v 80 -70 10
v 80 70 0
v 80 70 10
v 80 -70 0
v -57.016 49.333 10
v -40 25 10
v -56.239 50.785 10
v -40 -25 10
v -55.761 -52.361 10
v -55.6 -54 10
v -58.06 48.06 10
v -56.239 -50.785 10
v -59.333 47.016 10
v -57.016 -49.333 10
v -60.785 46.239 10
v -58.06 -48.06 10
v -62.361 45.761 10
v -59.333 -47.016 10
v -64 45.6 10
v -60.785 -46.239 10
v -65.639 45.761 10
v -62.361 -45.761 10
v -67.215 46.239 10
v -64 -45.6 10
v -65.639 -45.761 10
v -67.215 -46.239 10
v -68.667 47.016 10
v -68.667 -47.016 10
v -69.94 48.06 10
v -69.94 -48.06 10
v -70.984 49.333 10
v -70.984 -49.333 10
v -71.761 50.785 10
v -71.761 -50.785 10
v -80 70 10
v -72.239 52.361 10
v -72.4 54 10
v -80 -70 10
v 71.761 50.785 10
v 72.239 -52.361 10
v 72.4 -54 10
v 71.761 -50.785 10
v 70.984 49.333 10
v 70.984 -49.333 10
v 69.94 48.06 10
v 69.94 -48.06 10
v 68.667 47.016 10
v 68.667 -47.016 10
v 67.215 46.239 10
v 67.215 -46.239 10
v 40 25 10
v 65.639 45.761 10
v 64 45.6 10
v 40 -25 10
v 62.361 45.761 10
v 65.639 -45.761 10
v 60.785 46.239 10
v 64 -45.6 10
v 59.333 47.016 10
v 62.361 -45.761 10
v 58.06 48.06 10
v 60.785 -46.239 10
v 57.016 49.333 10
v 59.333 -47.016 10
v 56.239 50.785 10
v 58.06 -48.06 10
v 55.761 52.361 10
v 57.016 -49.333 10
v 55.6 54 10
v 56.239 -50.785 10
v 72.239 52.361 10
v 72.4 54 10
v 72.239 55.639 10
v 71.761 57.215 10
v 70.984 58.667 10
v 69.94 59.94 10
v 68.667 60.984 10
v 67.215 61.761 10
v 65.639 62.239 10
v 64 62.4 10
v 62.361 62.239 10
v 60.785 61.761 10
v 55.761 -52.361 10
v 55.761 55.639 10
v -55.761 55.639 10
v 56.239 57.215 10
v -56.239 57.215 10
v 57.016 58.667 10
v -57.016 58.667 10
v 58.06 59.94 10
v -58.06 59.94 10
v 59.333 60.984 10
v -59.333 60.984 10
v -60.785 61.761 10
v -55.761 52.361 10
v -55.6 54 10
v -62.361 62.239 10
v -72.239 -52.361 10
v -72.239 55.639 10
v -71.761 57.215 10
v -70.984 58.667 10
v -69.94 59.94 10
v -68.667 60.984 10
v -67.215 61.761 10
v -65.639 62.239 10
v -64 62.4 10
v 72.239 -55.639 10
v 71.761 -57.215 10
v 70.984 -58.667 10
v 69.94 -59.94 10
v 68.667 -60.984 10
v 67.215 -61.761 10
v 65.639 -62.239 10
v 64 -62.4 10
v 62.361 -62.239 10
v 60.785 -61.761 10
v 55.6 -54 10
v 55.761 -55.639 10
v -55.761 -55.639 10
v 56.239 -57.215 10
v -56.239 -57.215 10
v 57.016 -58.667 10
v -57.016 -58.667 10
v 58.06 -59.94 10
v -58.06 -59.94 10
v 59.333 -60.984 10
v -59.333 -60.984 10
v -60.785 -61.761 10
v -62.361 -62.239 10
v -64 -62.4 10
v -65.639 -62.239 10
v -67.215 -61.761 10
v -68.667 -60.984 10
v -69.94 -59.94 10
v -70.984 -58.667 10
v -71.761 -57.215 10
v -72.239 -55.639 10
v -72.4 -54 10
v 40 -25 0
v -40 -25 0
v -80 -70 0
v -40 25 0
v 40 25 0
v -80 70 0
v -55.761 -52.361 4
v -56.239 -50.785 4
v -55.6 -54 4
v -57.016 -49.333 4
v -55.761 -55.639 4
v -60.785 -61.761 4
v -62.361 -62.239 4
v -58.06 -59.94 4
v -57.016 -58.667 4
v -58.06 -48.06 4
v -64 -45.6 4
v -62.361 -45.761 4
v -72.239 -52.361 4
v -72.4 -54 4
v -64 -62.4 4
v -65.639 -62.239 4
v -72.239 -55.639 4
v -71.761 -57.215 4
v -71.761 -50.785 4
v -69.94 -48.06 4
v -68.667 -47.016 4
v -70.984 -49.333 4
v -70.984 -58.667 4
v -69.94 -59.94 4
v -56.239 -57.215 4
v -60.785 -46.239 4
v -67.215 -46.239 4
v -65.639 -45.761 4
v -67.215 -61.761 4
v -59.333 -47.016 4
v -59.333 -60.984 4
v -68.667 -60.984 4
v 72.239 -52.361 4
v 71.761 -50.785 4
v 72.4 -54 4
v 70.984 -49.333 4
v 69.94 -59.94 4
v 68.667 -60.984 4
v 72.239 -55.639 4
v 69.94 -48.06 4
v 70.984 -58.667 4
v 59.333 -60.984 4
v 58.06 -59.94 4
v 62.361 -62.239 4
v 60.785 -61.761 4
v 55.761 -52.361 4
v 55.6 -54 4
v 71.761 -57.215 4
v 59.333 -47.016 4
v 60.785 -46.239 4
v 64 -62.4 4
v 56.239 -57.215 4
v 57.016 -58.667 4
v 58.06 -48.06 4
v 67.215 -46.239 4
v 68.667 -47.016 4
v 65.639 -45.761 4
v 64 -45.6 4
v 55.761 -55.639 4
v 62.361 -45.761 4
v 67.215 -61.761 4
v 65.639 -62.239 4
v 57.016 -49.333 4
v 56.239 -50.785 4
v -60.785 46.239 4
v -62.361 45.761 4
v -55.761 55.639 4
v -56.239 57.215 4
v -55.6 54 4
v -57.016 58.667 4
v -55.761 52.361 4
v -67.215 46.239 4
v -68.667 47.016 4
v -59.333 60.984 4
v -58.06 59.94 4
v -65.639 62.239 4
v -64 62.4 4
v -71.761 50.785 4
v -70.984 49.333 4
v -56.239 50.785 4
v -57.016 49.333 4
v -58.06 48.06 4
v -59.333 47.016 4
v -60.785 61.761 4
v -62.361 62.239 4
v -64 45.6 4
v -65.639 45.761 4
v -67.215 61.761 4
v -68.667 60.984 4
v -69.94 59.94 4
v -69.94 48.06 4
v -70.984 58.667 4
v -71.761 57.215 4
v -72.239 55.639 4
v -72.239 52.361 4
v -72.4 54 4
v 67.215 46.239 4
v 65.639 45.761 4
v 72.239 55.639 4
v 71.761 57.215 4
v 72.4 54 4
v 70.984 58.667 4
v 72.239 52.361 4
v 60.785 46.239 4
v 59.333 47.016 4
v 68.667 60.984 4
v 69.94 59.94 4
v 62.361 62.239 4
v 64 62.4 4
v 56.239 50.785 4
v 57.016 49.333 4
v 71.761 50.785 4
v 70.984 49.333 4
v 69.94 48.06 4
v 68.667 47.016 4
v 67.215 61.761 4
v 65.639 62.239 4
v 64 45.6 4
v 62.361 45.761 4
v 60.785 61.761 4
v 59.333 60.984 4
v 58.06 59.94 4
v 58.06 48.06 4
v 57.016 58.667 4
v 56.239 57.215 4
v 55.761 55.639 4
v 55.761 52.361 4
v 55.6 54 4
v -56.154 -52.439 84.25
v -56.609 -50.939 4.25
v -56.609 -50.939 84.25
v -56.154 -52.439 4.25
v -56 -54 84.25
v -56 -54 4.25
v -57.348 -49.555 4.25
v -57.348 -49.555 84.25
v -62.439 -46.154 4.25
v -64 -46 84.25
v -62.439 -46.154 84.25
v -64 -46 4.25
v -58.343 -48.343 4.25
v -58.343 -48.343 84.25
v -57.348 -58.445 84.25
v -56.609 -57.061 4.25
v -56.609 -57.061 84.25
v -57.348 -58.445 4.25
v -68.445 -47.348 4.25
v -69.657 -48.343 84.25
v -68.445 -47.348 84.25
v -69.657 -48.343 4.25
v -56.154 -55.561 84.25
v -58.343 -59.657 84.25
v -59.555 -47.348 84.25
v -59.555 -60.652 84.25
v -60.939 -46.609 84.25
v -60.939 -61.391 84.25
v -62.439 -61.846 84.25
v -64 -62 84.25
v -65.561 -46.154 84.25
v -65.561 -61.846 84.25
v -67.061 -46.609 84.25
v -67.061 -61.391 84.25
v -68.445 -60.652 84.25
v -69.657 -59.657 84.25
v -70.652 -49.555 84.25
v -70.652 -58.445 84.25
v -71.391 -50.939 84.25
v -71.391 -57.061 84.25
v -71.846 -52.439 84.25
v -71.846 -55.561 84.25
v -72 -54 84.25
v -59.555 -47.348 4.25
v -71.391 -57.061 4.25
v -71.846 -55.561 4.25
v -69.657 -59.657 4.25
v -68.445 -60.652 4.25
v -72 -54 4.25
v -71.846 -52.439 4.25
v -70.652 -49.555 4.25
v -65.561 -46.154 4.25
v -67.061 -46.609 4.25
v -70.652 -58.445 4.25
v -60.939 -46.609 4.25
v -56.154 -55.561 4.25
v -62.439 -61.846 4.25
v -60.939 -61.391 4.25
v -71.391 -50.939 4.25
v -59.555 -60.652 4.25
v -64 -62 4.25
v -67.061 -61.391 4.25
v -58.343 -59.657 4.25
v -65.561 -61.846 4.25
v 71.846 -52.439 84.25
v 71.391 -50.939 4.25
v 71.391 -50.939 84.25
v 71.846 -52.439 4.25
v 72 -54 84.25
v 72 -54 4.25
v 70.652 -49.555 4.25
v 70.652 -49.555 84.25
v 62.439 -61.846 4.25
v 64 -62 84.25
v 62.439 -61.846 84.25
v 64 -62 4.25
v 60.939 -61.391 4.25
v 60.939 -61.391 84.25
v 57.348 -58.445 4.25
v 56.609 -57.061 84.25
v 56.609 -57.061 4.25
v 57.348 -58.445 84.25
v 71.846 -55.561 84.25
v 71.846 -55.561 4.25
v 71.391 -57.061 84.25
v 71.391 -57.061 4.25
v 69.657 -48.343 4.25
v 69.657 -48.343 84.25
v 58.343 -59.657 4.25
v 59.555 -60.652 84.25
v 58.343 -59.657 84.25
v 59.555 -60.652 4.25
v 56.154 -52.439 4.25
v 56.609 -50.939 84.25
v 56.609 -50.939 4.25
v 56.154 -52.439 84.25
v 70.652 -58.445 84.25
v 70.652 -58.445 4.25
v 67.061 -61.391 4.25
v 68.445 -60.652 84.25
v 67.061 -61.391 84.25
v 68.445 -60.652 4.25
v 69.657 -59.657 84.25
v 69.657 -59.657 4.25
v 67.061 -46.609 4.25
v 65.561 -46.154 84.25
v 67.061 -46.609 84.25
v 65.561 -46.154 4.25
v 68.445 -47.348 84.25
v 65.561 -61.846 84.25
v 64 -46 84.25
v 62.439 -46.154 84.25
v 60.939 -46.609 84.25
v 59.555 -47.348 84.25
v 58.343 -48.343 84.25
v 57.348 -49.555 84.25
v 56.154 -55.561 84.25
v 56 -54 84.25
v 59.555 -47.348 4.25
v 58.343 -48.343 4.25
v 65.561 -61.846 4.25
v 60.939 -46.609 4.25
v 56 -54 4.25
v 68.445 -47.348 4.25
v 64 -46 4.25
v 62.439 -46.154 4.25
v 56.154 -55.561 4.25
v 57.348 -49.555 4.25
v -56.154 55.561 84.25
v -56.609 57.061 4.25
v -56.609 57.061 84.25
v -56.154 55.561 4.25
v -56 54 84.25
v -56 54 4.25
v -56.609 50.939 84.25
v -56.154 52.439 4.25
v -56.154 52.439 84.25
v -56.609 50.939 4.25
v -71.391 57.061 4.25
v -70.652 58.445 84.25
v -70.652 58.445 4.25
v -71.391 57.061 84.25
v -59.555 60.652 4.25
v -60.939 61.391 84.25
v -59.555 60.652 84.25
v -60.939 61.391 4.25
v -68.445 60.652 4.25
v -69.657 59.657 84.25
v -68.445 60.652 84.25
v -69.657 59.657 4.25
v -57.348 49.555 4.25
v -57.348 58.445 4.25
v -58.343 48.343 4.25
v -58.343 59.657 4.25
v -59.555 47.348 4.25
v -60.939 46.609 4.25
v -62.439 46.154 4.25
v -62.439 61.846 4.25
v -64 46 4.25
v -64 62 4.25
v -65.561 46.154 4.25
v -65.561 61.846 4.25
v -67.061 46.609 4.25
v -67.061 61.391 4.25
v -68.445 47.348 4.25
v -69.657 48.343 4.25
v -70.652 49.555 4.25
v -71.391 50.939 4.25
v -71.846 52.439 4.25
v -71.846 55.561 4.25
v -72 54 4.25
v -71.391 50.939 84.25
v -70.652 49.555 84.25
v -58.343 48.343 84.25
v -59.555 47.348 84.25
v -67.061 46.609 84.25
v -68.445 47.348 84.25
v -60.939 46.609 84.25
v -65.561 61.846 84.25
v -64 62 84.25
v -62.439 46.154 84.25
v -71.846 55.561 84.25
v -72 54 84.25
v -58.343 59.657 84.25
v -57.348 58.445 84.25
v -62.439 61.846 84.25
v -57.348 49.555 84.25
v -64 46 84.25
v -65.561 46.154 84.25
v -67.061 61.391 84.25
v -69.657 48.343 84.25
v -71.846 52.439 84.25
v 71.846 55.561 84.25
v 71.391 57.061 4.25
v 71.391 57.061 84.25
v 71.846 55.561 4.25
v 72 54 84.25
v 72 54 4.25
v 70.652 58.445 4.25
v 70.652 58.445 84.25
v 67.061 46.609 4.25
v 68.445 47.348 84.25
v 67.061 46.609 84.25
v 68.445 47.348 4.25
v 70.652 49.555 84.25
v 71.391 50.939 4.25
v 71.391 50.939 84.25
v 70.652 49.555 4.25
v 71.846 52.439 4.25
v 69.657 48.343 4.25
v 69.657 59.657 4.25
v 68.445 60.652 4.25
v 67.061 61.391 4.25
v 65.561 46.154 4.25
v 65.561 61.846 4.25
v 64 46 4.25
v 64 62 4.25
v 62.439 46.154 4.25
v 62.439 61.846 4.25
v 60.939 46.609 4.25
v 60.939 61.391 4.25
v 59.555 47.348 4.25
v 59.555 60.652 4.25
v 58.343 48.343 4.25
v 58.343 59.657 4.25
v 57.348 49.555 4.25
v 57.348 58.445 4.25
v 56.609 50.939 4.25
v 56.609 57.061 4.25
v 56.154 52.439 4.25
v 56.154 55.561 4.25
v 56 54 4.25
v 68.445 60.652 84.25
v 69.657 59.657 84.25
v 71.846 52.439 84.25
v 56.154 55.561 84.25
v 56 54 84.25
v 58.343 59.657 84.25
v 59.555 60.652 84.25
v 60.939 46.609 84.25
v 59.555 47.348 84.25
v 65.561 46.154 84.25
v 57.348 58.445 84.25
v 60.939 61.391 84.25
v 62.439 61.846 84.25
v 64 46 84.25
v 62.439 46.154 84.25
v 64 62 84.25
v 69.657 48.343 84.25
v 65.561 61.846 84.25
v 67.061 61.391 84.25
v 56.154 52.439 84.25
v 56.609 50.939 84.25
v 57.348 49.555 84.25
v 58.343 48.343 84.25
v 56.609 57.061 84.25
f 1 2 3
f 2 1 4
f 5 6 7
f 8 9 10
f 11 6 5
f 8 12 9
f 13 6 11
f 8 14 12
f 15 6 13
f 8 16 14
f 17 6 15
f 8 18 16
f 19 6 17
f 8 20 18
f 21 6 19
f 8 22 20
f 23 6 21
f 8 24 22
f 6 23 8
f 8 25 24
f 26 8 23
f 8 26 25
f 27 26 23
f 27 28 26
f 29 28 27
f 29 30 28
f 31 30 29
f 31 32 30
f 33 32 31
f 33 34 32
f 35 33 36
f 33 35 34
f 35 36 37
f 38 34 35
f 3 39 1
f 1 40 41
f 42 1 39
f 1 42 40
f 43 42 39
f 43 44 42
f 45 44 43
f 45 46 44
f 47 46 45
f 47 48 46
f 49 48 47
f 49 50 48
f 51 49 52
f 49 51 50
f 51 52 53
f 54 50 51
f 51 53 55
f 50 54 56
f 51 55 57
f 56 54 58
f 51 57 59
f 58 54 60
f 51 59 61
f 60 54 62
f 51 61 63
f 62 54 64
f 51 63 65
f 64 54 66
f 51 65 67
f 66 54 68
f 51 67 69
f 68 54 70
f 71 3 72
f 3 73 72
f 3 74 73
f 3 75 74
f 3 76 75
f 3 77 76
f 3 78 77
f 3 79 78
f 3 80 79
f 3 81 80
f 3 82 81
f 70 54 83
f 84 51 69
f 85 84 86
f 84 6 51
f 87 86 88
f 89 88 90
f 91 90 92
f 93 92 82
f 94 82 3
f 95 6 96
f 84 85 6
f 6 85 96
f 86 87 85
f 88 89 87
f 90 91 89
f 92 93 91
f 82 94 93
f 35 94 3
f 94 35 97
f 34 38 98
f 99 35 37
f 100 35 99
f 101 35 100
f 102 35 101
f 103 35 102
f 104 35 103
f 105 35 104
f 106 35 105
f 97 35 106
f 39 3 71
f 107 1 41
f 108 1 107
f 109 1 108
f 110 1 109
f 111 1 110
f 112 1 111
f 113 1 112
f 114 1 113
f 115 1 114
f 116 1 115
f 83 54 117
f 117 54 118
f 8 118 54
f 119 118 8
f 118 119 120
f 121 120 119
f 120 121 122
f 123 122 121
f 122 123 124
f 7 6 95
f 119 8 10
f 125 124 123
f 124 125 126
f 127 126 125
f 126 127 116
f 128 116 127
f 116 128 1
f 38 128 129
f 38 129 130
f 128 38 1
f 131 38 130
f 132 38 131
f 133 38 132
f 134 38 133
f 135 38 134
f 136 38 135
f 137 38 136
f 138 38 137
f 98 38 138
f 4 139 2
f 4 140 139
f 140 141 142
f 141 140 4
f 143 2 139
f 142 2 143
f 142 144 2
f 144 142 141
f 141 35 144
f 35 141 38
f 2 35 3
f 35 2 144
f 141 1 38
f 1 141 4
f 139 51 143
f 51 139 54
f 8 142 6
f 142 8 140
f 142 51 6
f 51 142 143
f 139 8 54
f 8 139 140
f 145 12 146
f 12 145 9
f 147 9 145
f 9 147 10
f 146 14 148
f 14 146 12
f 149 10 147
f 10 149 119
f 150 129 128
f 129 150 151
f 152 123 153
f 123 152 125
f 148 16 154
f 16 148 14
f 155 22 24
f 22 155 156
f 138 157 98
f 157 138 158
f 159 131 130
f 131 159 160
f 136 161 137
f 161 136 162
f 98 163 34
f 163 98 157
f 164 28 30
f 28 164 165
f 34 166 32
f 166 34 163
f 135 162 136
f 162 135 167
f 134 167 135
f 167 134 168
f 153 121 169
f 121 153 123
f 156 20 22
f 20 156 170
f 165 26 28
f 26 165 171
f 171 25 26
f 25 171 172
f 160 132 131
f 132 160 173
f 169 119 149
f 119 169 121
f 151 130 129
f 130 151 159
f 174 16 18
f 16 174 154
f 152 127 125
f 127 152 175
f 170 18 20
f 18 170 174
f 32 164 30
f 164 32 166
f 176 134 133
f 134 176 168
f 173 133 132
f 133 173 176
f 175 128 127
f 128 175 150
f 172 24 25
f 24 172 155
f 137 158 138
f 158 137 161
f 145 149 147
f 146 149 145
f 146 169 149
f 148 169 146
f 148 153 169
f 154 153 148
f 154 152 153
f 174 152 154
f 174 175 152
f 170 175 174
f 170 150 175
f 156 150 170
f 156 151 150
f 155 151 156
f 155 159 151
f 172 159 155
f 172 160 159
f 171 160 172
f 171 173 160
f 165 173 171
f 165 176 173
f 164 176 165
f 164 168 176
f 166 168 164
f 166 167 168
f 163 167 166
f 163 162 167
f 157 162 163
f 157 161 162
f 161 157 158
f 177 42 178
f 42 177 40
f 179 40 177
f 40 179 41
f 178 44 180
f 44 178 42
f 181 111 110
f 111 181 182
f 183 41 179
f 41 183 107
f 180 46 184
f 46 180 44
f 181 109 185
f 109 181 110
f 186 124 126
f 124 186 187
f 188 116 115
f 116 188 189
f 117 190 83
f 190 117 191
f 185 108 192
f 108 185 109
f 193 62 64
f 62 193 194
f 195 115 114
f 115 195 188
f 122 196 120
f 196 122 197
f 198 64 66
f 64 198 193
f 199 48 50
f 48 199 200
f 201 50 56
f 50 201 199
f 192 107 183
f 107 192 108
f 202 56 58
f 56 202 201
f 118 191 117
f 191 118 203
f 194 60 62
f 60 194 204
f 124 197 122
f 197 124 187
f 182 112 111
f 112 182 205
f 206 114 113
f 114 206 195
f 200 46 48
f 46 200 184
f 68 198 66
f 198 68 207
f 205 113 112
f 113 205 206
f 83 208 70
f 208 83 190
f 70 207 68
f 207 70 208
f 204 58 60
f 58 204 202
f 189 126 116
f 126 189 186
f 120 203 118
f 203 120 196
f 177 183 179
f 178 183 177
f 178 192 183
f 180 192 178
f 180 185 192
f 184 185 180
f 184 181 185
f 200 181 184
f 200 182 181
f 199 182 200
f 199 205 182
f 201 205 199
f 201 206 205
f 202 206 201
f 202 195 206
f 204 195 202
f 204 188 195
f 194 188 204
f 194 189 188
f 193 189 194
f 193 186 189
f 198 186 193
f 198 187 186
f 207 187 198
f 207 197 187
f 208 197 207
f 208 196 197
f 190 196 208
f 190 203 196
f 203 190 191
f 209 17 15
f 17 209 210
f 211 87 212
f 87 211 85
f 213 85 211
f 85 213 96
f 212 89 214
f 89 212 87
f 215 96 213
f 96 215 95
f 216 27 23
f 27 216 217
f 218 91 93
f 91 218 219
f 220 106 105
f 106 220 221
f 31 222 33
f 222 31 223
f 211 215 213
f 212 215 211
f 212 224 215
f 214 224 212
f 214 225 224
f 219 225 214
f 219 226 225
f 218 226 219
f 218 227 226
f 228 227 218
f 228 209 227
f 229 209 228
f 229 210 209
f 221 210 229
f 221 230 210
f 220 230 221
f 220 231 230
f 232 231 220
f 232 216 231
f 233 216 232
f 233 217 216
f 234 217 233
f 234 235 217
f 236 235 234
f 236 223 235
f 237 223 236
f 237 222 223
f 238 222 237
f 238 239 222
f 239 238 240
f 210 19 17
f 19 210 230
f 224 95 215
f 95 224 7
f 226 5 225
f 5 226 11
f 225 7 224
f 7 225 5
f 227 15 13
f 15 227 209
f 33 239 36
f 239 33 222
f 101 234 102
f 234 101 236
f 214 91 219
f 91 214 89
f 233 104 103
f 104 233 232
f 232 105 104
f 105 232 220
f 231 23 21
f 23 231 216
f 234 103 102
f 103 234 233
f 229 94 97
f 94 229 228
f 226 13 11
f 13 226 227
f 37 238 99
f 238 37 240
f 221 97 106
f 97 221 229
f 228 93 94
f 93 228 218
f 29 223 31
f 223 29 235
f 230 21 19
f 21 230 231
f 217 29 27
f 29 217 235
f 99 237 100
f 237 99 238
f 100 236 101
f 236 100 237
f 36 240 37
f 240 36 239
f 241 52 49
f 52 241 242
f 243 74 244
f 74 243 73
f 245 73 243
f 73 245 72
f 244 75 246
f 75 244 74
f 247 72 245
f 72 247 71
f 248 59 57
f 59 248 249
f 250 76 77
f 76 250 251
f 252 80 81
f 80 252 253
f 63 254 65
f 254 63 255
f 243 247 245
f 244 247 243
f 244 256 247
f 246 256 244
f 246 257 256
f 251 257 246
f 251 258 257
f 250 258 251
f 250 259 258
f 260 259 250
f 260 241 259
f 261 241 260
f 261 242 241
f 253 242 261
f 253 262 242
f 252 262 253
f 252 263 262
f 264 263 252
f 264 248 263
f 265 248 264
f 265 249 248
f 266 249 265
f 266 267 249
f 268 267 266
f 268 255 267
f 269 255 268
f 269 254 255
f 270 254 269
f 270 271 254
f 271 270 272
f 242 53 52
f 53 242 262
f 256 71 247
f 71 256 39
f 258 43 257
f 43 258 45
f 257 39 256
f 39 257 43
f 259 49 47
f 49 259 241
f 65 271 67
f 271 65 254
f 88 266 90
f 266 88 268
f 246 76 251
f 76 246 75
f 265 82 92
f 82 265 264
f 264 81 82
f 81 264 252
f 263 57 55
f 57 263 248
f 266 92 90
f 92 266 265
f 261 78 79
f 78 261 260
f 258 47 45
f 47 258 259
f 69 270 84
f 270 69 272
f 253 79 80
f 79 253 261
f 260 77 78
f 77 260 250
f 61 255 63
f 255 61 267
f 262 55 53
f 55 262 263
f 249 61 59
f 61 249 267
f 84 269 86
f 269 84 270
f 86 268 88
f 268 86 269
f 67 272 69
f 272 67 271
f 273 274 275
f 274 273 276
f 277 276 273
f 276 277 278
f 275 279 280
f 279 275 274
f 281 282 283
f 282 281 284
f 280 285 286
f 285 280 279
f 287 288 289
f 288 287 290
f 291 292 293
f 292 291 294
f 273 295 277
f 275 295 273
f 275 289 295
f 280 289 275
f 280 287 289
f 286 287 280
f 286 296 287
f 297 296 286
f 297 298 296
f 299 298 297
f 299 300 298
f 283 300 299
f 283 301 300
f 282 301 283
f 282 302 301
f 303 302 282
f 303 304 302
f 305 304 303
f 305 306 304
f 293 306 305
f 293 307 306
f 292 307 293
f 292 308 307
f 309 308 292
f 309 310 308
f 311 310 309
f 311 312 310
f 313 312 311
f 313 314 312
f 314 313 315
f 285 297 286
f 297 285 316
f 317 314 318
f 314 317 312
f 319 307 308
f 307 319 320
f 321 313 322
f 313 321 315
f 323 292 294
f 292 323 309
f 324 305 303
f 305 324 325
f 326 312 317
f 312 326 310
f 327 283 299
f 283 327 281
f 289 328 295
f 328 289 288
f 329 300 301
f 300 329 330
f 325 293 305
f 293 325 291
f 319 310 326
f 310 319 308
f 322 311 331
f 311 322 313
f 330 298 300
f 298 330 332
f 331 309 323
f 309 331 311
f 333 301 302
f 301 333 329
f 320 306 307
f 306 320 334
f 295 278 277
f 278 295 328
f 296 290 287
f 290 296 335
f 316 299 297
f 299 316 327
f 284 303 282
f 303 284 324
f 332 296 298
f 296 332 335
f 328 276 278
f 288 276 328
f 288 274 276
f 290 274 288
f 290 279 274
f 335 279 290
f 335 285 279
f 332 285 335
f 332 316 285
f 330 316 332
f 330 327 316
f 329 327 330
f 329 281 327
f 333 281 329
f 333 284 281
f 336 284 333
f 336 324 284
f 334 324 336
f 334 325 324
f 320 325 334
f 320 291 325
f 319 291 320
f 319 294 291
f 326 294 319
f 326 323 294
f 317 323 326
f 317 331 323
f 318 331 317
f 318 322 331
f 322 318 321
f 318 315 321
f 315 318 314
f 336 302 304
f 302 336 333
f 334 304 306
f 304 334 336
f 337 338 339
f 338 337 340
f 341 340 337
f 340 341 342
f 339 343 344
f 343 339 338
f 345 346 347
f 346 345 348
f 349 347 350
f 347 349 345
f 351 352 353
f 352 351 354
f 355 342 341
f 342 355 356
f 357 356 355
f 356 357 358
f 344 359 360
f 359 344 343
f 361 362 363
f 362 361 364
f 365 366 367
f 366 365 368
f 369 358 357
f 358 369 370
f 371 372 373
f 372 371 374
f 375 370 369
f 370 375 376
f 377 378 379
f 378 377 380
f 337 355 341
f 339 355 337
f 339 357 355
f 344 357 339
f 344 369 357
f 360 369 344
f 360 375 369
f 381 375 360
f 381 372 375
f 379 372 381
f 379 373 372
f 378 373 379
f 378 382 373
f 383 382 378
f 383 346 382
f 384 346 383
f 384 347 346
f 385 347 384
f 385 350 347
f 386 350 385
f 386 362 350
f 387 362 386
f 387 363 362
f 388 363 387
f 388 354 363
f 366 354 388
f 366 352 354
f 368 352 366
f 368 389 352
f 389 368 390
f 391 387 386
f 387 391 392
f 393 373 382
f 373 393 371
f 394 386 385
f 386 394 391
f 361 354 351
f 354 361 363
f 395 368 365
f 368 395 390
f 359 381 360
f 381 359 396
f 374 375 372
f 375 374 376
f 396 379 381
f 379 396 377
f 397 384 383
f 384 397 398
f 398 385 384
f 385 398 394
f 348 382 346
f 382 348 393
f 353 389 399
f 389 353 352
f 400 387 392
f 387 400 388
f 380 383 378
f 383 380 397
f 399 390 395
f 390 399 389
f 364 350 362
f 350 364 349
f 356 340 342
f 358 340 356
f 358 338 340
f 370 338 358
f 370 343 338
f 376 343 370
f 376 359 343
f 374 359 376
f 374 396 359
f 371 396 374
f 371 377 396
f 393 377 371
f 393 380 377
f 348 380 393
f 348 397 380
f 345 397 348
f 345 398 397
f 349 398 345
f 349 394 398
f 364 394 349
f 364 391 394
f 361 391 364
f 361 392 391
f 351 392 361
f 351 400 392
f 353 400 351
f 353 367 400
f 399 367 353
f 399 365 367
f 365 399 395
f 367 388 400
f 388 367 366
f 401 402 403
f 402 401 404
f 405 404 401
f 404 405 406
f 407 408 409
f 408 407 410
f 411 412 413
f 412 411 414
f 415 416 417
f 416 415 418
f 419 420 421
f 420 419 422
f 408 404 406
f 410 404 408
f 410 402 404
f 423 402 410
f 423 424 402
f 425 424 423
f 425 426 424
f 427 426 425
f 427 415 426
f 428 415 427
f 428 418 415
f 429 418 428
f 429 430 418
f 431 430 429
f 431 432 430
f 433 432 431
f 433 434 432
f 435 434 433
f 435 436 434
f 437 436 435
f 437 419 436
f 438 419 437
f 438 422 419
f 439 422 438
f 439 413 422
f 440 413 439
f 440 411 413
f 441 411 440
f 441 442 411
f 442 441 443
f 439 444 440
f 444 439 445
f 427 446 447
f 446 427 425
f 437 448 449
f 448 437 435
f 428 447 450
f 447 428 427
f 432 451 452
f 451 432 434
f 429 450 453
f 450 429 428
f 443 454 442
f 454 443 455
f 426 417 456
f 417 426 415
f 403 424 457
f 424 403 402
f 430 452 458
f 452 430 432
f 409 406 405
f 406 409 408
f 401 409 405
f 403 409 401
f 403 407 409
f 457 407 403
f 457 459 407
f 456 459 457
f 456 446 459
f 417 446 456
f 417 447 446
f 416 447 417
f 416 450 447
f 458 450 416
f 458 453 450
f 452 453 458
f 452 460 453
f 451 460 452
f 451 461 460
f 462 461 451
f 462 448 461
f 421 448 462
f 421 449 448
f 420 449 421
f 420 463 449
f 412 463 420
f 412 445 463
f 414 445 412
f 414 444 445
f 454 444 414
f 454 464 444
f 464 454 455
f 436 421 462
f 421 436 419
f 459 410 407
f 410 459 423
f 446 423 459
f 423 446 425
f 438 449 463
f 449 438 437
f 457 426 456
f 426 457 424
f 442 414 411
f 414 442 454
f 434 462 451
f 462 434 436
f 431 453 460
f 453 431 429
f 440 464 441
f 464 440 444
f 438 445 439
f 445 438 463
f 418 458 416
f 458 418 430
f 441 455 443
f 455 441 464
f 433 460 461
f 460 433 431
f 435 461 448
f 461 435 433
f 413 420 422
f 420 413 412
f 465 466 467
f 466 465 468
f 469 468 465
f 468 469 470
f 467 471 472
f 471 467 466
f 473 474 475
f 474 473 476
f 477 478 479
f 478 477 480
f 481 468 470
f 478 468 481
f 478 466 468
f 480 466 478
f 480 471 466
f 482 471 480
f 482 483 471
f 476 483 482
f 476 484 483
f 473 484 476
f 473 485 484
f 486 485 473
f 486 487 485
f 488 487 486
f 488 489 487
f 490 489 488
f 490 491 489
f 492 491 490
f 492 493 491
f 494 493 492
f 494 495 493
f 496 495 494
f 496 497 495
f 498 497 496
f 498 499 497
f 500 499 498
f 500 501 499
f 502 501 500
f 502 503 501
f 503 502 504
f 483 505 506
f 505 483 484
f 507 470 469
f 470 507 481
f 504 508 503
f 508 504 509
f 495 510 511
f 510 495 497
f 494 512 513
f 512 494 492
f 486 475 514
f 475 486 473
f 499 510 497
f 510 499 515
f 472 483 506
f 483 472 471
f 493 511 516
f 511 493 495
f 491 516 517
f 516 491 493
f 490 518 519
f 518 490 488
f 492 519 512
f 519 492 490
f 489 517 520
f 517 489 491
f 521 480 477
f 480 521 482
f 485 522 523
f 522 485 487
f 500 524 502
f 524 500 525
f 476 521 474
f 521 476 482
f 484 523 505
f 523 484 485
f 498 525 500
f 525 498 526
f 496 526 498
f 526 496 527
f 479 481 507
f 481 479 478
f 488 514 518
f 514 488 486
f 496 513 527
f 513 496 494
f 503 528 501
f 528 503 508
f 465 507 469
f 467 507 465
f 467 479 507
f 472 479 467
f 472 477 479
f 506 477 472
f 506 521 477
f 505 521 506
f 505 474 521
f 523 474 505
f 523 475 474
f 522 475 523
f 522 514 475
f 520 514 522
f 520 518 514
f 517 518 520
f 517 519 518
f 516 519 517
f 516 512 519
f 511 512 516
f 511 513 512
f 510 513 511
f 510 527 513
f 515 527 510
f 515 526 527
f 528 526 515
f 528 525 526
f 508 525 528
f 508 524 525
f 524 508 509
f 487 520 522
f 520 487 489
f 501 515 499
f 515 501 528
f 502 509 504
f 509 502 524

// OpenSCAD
$fn = 32;

// ------------------------------------------------------------------------
// Frame with four posts: 160 x 140 mm frame, four d16 posts
// Every part is its own module, assembly() places them once.
// ------------------------------------------------------------------------

// --- part 1 ---
module base_frame() {
  difference() {
    translate([-80, -70, 0]) cube([160, 140, 10]);
    translate([-40, -25, -1]) cube([80, 50, 12]);
    translate([-64, -54, 4]) cylinder(h = 7, d = 16.8);
    translate([64, -54, 4]) cylinder(h = 7, d = 16.8);
    translate([-64, 54, 4]) cylinder(h = 7, d = 16.8);
    translate([64, 54, 4]) cylinder(h = 7, d = 16.8);
  }
}

// --- part 2 ---
module post1() {
  cylinder(h = 80, d = 16);
}

// --- part 3 ---
module post2() {
  cylinder(h = 80, d = 16);
}

// --- part 4 ---
module post3() {
  cylinder(h = 80, d = 16);
}

// --- part 5 ---
module post4() {
  cylinder(h = 80, d = 16);
}

// --- assembly ---
module assembly() {
  translate([0, 0, 0]) rotate([0, 0, 0]) base_frame();
  translate([-64, -54, 4.25]) rotate([0, 0, 0]) post1();
  translate([64, -54, 4.25]) rotate([0, 0, 0]) post2();
  translate([-64, 54, 4.25]) rotate([0, 0, 0]) post3();
  translate([64, 54, 4.25]) rotate([0, 0, 0]) post4();
}

assembly();
